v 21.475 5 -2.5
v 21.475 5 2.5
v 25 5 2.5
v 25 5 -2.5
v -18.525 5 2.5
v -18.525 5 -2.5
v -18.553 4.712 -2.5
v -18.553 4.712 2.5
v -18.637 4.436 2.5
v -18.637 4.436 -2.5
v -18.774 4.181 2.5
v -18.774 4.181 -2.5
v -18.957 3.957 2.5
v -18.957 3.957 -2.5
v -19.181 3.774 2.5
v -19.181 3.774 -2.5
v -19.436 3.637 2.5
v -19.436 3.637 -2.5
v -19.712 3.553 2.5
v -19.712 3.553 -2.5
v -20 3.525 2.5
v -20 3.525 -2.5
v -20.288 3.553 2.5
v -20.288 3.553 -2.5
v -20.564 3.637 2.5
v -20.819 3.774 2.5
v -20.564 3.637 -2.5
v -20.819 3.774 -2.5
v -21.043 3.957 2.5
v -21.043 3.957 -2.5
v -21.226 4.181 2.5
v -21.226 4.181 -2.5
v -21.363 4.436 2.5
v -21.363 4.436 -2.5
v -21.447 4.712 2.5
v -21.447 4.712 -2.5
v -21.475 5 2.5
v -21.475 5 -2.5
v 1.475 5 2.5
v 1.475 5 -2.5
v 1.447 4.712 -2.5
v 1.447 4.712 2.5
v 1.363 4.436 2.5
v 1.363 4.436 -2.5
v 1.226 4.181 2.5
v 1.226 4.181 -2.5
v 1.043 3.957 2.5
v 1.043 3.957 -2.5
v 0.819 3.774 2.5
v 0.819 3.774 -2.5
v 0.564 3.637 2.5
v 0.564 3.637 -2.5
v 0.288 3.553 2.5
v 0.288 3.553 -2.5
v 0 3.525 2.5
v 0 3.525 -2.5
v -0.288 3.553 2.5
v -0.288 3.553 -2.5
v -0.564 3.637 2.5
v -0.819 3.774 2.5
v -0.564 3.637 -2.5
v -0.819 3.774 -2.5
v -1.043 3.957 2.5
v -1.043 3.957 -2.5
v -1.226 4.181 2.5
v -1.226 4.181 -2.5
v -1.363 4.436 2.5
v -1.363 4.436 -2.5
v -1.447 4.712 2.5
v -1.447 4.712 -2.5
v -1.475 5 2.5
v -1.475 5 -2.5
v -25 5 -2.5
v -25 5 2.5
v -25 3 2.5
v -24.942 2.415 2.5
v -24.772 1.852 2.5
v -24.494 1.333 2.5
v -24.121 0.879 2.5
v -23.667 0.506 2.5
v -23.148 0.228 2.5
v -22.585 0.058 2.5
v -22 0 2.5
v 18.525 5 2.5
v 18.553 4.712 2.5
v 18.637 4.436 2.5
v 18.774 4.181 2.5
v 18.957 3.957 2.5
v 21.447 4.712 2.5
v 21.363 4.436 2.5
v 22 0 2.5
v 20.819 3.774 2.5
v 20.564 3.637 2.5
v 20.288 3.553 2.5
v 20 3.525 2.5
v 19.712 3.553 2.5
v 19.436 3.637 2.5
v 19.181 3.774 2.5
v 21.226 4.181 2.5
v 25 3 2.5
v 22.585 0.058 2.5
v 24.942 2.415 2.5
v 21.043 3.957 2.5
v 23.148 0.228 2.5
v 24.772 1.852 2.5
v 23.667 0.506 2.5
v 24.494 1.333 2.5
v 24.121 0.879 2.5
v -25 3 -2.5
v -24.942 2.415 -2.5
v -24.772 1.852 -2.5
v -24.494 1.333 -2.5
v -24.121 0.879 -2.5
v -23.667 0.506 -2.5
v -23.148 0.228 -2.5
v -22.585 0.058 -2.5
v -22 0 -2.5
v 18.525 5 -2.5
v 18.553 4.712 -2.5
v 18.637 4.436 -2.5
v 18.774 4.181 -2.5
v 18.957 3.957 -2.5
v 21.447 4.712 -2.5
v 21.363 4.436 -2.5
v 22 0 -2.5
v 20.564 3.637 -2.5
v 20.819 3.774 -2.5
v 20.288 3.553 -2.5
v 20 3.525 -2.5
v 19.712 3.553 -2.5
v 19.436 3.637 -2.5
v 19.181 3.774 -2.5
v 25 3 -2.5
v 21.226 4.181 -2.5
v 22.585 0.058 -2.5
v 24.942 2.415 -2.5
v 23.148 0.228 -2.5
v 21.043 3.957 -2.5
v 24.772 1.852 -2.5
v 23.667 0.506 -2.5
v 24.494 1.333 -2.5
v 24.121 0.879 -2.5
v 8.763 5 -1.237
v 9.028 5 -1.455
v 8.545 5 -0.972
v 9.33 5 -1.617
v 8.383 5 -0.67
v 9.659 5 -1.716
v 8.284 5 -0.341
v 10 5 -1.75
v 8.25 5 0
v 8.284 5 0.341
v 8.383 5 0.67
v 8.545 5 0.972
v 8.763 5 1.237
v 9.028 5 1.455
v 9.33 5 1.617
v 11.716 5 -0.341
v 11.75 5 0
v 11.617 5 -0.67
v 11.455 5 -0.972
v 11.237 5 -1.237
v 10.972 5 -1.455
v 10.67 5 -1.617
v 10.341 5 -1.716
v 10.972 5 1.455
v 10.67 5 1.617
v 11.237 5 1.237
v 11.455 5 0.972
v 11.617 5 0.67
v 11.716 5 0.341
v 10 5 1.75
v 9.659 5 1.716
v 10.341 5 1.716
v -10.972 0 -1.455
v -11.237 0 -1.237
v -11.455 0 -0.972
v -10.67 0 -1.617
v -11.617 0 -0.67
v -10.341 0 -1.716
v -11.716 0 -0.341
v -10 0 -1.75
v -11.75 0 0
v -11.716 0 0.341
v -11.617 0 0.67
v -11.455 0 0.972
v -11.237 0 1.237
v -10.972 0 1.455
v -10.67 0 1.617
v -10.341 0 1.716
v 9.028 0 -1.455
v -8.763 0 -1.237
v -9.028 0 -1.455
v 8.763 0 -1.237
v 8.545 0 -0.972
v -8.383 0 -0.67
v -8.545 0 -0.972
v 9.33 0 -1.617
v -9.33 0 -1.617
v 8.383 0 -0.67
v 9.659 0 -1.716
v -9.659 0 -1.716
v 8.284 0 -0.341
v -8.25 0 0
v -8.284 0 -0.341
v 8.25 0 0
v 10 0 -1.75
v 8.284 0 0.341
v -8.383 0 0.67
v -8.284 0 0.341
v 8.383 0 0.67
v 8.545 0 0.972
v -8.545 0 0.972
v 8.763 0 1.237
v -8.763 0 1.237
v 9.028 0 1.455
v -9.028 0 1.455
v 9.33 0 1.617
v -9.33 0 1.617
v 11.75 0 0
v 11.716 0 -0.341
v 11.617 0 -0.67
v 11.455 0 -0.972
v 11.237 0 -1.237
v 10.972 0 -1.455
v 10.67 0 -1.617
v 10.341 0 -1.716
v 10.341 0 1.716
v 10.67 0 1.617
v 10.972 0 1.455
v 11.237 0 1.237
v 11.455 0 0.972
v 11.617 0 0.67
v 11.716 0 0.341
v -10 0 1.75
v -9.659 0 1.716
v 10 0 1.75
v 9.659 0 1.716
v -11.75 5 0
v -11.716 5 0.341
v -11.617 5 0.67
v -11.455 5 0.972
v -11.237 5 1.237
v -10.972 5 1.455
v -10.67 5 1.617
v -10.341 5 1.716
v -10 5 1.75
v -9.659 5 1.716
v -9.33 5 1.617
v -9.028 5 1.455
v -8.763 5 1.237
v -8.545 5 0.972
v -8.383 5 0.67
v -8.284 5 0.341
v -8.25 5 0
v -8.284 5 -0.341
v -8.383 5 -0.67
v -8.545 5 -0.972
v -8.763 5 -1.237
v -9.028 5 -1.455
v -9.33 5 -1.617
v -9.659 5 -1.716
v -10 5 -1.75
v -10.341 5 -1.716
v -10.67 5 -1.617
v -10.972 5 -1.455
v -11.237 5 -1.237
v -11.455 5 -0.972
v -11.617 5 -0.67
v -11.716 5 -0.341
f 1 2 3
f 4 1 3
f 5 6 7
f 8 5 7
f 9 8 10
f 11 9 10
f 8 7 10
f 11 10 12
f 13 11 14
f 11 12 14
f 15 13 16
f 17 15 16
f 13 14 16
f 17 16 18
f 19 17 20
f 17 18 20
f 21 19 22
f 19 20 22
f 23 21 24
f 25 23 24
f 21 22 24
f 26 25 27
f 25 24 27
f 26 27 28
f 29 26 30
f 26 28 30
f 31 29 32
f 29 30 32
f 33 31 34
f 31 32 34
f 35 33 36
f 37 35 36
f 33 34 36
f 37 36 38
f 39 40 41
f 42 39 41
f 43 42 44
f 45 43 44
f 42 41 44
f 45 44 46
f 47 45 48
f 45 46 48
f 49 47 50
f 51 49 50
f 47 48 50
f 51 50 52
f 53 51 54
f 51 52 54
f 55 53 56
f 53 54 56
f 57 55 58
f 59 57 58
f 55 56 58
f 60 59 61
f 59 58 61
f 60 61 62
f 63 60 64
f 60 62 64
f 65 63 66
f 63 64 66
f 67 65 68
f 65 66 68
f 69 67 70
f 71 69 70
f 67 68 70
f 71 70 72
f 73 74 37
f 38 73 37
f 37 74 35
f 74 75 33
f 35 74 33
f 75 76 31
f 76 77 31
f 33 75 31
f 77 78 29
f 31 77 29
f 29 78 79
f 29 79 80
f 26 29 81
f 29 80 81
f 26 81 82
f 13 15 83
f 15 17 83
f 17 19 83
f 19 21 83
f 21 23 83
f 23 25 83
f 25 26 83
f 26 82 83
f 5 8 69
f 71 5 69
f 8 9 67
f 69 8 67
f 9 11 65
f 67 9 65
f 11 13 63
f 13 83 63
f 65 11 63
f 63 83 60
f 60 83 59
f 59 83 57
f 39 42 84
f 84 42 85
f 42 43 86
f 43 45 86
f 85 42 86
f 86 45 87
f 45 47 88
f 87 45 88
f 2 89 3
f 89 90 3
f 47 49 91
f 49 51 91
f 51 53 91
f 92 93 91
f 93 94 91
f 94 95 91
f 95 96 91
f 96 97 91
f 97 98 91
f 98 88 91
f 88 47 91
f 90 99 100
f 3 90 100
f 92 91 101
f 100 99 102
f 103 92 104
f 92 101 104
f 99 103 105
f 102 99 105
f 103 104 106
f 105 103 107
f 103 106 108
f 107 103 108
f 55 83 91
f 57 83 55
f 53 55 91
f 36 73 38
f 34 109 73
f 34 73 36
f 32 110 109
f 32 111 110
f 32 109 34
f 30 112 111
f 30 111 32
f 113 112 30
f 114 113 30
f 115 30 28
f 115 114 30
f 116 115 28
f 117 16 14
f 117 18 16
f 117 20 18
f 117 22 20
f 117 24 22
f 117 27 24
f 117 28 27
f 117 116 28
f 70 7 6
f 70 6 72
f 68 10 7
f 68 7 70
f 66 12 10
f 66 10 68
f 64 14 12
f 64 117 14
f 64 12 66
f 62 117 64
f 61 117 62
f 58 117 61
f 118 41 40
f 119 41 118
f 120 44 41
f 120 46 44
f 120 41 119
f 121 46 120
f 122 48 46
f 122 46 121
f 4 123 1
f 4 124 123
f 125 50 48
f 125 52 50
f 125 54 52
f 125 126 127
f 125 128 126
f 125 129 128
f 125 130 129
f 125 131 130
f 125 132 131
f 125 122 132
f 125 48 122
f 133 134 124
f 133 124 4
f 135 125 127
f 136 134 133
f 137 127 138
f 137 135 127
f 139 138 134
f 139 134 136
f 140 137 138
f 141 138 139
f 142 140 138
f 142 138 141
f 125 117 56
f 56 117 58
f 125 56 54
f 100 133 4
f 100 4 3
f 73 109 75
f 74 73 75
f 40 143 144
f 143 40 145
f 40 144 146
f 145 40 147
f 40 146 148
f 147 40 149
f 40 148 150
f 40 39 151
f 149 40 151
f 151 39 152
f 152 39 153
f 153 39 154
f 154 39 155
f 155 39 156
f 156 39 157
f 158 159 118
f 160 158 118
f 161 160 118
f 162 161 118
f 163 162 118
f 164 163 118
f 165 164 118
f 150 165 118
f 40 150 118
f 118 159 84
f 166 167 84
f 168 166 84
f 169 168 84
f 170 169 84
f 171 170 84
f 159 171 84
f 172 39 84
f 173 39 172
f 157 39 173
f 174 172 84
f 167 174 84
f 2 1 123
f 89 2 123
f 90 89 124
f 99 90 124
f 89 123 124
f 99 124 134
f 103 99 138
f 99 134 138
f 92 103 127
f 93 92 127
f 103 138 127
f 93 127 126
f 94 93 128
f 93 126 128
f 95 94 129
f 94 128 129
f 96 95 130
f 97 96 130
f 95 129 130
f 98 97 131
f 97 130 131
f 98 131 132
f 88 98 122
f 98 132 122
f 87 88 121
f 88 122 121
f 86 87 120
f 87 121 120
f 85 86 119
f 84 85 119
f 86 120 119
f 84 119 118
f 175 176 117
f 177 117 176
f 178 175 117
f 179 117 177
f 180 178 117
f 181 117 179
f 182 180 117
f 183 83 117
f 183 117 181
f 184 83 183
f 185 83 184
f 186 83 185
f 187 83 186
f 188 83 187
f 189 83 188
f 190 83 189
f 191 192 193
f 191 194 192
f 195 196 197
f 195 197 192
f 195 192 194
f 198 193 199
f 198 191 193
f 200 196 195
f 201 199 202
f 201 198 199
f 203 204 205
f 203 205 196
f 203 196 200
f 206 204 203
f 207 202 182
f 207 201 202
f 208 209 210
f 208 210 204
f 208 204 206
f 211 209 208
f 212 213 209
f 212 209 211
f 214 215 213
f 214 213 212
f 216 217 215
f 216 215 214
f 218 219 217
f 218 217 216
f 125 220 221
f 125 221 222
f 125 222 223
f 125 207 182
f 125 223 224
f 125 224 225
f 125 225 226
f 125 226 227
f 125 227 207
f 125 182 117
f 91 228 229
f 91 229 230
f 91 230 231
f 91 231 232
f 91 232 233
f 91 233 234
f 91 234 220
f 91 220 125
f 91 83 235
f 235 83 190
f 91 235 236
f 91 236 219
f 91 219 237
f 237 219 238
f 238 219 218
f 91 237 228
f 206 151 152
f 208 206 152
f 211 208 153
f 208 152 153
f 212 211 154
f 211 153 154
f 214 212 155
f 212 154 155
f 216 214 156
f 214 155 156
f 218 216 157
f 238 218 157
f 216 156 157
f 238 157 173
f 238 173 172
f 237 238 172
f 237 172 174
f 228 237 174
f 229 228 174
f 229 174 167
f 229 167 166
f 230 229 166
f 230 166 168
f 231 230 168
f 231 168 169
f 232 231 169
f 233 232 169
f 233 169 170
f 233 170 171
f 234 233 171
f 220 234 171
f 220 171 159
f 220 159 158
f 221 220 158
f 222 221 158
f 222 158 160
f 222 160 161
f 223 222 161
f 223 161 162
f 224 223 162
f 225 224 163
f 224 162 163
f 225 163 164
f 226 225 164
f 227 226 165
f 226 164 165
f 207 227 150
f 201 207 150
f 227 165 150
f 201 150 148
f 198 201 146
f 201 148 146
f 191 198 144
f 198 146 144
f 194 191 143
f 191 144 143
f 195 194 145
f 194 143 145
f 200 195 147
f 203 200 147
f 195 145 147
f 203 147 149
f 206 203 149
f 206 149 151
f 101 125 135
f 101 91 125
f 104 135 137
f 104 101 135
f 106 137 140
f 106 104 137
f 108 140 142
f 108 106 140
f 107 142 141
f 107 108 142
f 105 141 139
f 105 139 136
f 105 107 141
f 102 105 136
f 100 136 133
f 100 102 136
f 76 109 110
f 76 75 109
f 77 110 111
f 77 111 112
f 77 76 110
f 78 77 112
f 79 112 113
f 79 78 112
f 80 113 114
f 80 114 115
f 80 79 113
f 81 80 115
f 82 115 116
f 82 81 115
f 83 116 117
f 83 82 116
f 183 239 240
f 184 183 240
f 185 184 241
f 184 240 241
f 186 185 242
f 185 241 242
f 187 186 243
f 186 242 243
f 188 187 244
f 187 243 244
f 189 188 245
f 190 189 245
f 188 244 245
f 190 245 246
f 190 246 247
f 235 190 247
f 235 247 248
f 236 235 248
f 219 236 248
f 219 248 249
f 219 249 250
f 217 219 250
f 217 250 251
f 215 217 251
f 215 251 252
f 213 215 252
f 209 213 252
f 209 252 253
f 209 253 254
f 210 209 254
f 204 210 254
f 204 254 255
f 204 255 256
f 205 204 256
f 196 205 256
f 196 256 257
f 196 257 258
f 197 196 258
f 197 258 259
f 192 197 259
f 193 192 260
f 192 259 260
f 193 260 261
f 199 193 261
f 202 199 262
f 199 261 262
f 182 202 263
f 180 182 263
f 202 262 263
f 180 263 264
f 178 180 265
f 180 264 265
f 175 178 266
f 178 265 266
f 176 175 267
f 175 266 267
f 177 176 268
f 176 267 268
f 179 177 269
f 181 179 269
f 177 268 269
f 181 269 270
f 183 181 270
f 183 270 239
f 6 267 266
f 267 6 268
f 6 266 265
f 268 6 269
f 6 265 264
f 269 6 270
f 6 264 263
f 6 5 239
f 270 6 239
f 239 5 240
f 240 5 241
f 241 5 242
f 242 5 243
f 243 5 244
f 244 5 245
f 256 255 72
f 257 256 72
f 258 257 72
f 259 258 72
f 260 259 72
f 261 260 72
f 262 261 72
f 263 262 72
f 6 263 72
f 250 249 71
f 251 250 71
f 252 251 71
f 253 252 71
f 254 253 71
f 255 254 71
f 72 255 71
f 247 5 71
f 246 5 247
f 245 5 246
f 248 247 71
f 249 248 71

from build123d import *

# Parameters (mm, degrees)
F0_W     = 50
F0_H     = 5
F1_DEPTH = 5
F2_D     = 3.5
F3_R     = 3
F5_D     = 2.95


with BuildPart() as f1:
    # F0 (on Front) → F1 (new body)
    with BuildSketch(Plane.XZ):
        Rectangle(F0_W, F0_H)
    extrude(amount=-F1_DEPTH)

    # F2 (through all)
    with Locations(Plane.XZ):
        with Locations((-10, 0), (10, 0)):
            Hole(F2_D / 2)

    # F3
    f3_edges = [f1.edges().sort_by_distance(p)[0] for p in [
        (-25, 0, 0),
        (25, 0, 0),
    ]]
    fillet(f3_edges, radius=F3_R)

    # F5 (through all)
    with Locations(Plane.XY.offset(2.5)):
        with Locations((-20, 5), (0, 5), (20, 5)):
            Hole(F5_D / 2)


solid = f1.part
